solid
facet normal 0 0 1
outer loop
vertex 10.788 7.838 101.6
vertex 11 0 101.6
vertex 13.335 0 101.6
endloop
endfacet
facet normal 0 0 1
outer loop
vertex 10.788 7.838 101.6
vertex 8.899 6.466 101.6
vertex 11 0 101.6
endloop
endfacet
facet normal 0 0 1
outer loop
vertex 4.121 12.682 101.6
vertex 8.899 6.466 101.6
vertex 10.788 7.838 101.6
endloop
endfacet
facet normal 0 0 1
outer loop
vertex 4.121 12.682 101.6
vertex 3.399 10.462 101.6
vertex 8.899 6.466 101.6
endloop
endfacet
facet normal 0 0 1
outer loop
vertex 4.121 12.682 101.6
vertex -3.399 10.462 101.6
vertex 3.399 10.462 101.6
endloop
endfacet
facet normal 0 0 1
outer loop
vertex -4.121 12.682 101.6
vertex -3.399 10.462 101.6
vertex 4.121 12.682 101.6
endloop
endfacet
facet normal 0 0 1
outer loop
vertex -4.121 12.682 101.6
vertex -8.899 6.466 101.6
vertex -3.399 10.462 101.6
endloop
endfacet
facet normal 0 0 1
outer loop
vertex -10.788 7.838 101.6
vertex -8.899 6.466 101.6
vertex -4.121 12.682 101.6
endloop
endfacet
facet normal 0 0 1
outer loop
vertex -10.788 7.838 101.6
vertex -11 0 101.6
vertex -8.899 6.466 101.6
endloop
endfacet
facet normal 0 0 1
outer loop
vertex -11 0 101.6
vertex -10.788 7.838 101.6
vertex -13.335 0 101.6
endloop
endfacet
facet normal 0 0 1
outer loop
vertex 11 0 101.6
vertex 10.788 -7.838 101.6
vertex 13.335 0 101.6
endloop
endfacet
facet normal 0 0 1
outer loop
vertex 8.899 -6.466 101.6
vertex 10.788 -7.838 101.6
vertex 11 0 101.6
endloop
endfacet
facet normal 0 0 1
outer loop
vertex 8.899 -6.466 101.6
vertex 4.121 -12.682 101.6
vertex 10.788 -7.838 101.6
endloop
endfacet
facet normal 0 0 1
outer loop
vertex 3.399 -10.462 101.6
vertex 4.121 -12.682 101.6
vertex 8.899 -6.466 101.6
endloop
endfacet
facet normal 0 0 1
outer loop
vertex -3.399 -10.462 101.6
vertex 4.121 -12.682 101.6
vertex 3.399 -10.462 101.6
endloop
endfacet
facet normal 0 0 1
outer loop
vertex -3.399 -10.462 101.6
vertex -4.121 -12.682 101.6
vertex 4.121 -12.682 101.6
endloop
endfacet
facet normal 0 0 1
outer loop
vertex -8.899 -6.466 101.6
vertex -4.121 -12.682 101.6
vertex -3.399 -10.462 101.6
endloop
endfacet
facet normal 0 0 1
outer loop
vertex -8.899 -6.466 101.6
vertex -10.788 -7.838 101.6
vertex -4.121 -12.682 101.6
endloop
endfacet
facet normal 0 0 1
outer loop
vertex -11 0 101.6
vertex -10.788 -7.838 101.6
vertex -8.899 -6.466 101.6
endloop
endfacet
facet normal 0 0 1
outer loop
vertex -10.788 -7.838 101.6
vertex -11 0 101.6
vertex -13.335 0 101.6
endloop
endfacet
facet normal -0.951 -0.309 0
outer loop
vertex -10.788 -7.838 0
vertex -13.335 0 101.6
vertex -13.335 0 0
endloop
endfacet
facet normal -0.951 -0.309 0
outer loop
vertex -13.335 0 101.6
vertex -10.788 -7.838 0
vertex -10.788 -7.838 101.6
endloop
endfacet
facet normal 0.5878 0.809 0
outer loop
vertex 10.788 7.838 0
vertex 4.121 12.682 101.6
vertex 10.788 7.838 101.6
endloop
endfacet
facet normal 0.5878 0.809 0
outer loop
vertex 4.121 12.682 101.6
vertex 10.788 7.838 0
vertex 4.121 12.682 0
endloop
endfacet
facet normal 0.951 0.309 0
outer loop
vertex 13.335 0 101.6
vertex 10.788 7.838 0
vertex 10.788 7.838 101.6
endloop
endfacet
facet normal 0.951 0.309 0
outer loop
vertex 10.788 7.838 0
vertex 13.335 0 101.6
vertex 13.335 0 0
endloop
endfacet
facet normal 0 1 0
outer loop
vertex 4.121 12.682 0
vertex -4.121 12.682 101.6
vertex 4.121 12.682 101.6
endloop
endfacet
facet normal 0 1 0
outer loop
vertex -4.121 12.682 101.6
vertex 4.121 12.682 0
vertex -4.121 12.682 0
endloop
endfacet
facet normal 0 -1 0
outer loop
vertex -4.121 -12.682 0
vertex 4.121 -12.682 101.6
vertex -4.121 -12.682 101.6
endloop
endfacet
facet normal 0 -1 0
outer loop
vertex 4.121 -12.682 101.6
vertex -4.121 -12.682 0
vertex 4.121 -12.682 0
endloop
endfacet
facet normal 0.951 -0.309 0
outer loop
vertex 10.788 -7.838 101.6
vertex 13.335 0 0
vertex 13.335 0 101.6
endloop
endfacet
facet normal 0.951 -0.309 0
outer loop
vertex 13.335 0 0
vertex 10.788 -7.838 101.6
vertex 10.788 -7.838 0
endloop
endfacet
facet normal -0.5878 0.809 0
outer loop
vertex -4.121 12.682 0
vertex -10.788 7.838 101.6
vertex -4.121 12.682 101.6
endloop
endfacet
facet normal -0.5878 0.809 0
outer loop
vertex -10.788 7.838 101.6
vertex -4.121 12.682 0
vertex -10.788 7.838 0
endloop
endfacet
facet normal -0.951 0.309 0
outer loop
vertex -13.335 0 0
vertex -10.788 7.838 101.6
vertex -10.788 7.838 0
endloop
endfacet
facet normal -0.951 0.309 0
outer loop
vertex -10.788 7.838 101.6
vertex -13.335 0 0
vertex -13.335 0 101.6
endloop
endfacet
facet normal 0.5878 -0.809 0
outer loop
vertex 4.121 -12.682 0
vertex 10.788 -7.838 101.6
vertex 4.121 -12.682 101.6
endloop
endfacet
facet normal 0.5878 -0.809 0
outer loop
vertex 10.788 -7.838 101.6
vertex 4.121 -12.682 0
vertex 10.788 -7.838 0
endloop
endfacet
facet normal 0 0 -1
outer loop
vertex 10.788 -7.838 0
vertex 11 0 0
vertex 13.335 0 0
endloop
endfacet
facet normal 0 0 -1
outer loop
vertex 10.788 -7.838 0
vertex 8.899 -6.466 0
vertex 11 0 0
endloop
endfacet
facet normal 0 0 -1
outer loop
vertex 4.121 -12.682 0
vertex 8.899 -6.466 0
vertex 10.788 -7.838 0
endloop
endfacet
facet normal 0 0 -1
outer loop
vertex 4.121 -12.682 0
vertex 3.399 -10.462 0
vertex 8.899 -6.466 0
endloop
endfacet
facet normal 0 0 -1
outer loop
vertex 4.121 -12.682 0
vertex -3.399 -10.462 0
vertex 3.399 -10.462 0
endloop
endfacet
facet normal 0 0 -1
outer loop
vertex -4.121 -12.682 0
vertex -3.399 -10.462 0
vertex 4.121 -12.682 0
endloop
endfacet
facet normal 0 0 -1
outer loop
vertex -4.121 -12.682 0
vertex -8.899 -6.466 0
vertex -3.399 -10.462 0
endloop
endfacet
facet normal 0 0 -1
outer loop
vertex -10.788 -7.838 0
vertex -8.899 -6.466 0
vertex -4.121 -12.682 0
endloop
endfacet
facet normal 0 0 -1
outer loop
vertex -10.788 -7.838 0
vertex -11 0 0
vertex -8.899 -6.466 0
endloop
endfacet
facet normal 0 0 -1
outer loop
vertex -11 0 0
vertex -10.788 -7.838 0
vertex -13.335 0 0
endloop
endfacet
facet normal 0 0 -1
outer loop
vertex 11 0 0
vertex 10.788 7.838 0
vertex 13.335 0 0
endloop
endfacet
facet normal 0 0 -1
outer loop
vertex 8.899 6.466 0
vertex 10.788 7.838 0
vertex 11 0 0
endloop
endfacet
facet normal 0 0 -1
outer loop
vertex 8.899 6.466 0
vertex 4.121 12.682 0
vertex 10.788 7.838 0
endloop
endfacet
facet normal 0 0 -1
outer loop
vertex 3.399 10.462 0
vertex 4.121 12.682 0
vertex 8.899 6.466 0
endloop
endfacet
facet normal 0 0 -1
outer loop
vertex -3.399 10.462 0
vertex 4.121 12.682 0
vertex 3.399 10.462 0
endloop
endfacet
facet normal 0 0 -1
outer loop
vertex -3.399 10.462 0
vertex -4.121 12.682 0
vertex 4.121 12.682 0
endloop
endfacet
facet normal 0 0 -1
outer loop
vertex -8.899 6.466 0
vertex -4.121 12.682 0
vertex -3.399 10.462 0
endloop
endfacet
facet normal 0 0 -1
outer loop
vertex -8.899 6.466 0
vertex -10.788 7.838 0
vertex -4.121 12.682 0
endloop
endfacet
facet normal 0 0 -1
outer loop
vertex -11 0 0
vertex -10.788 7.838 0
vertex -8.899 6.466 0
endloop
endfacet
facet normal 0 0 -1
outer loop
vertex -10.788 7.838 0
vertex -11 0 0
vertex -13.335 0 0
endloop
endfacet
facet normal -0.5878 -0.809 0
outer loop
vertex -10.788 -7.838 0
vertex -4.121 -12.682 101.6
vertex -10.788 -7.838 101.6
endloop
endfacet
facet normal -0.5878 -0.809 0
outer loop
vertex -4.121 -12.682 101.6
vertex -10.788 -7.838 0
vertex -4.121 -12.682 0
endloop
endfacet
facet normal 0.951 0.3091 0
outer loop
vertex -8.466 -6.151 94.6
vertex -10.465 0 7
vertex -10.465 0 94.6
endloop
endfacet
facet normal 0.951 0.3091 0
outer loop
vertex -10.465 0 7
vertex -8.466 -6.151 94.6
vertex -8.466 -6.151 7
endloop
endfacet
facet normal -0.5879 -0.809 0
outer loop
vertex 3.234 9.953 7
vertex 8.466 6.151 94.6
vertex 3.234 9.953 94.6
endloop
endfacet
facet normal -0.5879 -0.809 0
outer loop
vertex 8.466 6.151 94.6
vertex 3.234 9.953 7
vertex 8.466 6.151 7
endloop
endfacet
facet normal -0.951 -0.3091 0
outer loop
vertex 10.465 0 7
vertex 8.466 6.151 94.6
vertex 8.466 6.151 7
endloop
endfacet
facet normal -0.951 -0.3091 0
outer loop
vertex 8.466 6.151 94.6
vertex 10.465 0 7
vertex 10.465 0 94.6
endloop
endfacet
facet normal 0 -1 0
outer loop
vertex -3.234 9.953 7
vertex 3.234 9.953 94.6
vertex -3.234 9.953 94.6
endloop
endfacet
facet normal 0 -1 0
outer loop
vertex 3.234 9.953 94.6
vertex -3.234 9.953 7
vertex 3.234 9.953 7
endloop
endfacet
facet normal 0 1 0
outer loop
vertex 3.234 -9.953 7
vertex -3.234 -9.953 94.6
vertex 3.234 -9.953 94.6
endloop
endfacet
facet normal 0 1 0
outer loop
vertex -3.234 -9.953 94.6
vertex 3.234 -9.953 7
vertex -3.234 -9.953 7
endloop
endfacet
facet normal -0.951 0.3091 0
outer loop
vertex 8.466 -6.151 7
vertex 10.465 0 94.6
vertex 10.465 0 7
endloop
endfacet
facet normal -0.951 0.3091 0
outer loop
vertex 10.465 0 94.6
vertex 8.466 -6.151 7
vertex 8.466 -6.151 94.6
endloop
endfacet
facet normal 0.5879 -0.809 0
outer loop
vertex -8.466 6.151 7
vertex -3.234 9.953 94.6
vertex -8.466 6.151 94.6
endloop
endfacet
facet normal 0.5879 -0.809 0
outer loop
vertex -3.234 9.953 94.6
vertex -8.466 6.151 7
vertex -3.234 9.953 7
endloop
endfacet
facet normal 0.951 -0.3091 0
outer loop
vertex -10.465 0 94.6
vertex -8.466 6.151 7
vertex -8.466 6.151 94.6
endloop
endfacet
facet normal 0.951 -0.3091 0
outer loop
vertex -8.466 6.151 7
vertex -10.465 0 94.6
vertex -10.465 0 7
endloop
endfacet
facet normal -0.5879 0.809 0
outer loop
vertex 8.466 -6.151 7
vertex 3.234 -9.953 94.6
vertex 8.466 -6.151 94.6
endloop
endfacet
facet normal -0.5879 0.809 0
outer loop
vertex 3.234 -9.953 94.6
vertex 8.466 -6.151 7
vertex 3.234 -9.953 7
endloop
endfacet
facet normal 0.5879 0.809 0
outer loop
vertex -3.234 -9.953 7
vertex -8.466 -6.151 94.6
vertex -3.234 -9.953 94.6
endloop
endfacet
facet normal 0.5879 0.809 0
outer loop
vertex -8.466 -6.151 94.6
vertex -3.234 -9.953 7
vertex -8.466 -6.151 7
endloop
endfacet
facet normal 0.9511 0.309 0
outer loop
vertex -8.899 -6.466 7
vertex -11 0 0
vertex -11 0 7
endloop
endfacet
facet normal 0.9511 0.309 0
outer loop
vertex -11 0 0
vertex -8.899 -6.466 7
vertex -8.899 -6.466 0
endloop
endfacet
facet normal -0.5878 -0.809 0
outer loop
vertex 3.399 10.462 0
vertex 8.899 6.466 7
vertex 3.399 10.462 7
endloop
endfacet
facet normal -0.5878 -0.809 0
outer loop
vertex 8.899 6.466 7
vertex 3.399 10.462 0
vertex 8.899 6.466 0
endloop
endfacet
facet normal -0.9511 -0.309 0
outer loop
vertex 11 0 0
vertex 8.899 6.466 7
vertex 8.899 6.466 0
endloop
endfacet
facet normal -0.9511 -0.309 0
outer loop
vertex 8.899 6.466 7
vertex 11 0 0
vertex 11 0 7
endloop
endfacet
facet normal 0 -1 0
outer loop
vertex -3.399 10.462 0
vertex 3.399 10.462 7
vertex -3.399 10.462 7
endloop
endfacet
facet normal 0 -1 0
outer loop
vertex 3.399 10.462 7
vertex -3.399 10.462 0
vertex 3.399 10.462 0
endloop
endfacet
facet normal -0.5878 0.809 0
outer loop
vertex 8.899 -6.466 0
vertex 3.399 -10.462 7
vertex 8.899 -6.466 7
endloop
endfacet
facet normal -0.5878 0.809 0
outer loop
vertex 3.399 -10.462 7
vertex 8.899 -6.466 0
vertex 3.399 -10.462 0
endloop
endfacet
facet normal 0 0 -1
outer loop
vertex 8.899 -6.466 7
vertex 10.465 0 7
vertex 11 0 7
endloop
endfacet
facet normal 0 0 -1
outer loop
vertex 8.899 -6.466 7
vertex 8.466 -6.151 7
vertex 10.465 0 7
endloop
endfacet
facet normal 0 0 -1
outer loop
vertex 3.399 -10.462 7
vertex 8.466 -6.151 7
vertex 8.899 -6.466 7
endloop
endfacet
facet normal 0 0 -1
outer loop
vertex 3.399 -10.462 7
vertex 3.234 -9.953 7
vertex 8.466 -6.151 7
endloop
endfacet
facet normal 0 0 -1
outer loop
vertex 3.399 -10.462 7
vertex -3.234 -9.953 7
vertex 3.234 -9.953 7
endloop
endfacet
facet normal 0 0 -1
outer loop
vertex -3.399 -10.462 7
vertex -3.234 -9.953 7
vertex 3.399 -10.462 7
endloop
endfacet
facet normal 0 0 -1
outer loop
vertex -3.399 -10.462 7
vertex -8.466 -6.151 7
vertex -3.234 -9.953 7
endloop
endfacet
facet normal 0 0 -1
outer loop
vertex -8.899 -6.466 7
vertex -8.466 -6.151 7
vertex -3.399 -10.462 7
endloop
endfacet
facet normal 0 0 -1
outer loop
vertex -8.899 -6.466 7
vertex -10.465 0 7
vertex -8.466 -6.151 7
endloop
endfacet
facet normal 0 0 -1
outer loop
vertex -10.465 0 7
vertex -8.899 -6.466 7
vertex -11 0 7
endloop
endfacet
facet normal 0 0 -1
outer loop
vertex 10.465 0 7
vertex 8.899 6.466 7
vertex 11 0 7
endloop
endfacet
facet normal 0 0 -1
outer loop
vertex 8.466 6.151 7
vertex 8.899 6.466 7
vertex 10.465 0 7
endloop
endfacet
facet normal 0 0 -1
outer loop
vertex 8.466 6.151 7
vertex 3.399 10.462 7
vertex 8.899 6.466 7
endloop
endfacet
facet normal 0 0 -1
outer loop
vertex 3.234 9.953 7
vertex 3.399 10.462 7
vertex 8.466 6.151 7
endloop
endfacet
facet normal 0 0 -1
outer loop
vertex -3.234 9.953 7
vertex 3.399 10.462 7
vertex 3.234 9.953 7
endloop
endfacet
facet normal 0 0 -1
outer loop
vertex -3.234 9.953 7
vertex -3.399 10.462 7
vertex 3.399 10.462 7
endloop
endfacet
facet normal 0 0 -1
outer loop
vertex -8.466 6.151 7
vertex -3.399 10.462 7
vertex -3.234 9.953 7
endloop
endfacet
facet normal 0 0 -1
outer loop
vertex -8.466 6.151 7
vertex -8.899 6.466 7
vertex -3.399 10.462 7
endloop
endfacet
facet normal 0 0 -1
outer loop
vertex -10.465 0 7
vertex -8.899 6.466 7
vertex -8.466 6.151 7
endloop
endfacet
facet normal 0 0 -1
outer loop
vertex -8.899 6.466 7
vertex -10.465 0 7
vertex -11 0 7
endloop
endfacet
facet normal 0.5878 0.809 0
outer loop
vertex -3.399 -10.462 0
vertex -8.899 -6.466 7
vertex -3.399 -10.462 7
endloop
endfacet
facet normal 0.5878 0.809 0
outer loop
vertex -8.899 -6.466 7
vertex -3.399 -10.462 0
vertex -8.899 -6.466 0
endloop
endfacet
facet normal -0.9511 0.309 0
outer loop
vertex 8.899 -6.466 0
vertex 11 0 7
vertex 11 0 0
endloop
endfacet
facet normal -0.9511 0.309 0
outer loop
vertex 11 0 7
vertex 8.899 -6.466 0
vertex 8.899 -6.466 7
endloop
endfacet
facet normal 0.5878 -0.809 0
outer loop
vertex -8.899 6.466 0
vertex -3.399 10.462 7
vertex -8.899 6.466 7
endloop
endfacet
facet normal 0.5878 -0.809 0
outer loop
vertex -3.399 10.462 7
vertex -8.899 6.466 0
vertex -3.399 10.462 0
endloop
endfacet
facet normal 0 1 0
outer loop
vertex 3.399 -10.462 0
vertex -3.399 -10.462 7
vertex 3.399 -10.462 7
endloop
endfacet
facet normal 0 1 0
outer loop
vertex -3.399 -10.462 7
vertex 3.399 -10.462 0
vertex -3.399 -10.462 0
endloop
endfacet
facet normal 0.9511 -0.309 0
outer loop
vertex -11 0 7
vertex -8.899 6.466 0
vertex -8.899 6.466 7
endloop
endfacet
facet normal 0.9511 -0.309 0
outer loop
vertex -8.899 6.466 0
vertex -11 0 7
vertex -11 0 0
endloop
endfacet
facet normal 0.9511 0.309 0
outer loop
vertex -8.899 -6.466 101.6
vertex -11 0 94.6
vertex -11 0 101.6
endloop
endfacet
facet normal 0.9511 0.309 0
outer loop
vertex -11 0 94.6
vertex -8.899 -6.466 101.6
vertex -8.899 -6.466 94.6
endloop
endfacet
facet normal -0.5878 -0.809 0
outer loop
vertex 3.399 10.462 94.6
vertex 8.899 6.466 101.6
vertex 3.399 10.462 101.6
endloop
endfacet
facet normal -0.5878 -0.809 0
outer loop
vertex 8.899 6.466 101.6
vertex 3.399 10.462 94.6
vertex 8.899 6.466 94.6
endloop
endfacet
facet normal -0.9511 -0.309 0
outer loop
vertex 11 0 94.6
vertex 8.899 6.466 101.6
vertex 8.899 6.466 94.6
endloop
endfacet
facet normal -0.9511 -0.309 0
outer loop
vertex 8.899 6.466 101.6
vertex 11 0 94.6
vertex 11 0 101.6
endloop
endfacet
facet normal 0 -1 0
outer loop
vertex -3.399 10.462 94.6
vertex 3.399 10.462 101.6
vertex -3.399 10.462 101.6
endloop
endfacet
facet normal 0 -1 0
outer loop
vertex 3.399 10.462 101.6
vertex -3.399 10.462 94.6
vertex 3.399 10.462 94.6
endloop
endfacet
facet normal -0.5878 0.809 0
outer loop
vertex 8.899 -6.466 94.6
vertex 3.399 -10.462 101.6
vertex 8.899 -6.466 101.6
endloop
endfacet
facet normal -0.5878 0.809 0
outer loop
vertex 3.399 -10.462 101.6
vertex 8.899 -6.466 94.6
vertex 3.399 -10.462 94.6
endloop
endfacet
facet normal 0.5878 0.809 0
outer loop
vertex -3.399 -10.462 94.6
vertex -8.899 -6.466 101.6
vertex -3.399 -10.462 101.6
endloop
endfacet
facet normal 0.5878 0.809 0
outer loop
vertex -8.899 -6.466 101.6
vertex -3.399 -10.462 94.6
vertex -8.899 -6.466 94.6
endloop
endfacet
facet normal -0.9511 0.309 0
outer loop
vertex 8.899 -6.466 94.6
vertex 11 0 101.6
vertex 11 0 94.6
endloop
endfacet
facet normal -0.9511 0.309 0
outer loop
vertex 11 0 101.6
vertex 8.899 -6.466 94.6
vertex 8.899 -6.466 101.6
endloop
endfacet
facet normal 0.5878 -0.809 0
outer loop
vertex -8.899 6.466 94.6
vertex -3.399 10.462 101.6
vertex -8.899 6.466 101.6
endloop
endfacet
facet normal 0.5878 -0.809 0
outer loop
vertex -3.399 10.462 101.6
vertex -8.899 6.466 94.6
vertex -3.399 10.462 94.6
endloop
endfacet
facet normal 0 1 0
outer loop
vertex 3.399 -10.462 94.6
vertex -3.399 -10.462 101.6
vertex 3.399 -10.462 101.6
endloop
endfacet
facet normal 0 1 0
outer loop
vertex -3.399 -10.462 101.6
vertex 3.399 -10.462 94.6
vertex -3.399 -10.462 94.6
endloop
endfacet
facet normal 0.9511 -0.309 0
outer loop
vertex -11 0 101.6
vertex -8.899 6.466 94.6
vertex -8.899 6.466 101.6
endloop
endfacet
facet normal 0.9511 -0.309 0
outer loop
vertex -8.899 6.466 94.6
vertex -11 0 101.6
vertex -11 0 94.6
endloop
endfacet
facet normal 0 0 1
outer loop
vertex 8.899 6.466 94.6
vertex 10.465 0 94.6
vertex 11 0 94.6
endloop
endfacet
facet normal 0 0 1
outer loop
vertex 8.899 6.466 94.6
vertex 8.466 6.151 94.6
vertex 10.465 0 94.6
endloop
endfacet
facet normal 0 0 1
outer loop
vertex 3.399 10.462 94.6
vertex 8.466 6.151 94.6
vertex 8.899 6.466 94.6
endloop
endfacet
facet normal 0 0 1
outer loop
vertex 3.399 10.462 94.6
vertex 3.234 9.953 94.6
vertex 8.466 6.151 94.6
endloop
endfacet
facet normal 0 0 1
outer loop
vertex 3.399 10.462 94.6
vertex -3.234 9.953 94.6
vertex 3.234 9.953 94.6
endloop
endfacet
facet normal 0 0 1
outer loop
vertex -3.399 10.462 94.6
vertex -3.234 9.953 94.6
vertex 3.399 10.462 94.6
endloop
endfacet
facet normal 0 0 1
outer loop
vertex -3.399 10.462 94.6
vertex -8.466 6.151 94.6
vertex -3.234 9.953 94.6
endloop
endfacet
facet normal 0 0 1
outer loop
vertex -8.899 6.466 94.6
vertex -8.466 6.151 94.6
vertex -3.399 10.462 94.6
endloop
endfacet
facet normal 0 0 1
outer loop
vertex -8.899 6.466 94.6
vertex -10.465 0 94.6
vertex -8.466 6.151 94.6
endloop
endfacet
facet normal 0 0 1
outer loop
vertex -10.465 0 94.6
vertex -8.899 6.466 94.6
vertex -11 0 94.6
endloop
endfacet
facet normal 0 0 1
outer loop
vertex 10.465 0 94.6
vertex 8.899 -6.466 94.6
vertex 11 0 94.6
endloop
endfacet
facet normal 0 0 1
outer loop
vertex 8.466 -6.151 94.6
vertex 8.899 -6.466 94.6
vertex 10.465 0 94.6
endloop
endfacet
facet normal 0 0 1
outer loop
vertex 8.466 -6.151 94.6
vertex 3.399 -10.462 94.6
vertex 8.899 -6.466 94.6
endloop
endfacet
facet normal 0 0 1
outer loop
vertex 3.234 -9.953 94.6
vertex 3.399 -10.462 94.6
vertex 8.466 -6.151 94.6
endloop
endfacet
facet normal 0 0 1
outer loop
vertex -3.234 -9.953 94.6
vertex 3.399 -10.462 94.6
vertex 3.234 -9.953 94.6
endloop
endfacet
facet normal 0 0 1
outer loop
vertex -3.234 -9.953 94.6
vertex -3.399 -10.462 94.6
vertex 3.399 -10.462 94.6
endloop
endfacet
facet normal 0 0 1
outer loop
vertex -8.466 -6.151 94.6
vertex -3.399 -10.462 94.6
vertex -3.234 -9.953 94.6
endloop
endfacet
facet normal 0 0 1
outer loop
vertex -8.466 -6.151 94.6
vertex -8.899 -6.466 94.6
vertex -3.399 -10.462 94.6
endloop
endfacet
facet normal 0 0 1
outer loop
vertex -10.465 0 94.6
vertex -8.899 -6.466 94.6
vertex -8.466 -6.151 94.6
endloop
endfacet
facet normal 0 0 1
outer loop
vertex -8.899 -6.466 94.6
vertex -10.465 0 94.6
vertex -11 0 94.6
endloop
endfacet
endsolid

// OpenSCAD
// file: modules/wood.scad
$fn = 10;
mmToIn = 25.4;
one    = 0.75 * mmToIn;
two    = 1.5  * mmToIn;
four   = 3.5  * mmToIn;

module 1x2(length){
     cube([one,two,length*mmToIn],0);
}
module 2x4(length){
     cube([two,four,length*mmToIn],0);
}

module 1x4(length){
     cube([one,four,length*mmToIn],0);
}
// main file
$fn = 100;
include <./modules/wood.scad>
module roller()
{
	//inside diameter
	id = 20.93;  //mm
	//outside diameter
	od = 26.67; //mm
	//width
	w  = 4 * mmToIn;  //mm
	difference()
	{
		cylinder(d=od,h=w);
		cylinder(d=id,h=w);
        cylinder(d=22,h=7);
        translate([0,0,w-7])cylinder(d=22,h=7);
	}	

}
roller();
